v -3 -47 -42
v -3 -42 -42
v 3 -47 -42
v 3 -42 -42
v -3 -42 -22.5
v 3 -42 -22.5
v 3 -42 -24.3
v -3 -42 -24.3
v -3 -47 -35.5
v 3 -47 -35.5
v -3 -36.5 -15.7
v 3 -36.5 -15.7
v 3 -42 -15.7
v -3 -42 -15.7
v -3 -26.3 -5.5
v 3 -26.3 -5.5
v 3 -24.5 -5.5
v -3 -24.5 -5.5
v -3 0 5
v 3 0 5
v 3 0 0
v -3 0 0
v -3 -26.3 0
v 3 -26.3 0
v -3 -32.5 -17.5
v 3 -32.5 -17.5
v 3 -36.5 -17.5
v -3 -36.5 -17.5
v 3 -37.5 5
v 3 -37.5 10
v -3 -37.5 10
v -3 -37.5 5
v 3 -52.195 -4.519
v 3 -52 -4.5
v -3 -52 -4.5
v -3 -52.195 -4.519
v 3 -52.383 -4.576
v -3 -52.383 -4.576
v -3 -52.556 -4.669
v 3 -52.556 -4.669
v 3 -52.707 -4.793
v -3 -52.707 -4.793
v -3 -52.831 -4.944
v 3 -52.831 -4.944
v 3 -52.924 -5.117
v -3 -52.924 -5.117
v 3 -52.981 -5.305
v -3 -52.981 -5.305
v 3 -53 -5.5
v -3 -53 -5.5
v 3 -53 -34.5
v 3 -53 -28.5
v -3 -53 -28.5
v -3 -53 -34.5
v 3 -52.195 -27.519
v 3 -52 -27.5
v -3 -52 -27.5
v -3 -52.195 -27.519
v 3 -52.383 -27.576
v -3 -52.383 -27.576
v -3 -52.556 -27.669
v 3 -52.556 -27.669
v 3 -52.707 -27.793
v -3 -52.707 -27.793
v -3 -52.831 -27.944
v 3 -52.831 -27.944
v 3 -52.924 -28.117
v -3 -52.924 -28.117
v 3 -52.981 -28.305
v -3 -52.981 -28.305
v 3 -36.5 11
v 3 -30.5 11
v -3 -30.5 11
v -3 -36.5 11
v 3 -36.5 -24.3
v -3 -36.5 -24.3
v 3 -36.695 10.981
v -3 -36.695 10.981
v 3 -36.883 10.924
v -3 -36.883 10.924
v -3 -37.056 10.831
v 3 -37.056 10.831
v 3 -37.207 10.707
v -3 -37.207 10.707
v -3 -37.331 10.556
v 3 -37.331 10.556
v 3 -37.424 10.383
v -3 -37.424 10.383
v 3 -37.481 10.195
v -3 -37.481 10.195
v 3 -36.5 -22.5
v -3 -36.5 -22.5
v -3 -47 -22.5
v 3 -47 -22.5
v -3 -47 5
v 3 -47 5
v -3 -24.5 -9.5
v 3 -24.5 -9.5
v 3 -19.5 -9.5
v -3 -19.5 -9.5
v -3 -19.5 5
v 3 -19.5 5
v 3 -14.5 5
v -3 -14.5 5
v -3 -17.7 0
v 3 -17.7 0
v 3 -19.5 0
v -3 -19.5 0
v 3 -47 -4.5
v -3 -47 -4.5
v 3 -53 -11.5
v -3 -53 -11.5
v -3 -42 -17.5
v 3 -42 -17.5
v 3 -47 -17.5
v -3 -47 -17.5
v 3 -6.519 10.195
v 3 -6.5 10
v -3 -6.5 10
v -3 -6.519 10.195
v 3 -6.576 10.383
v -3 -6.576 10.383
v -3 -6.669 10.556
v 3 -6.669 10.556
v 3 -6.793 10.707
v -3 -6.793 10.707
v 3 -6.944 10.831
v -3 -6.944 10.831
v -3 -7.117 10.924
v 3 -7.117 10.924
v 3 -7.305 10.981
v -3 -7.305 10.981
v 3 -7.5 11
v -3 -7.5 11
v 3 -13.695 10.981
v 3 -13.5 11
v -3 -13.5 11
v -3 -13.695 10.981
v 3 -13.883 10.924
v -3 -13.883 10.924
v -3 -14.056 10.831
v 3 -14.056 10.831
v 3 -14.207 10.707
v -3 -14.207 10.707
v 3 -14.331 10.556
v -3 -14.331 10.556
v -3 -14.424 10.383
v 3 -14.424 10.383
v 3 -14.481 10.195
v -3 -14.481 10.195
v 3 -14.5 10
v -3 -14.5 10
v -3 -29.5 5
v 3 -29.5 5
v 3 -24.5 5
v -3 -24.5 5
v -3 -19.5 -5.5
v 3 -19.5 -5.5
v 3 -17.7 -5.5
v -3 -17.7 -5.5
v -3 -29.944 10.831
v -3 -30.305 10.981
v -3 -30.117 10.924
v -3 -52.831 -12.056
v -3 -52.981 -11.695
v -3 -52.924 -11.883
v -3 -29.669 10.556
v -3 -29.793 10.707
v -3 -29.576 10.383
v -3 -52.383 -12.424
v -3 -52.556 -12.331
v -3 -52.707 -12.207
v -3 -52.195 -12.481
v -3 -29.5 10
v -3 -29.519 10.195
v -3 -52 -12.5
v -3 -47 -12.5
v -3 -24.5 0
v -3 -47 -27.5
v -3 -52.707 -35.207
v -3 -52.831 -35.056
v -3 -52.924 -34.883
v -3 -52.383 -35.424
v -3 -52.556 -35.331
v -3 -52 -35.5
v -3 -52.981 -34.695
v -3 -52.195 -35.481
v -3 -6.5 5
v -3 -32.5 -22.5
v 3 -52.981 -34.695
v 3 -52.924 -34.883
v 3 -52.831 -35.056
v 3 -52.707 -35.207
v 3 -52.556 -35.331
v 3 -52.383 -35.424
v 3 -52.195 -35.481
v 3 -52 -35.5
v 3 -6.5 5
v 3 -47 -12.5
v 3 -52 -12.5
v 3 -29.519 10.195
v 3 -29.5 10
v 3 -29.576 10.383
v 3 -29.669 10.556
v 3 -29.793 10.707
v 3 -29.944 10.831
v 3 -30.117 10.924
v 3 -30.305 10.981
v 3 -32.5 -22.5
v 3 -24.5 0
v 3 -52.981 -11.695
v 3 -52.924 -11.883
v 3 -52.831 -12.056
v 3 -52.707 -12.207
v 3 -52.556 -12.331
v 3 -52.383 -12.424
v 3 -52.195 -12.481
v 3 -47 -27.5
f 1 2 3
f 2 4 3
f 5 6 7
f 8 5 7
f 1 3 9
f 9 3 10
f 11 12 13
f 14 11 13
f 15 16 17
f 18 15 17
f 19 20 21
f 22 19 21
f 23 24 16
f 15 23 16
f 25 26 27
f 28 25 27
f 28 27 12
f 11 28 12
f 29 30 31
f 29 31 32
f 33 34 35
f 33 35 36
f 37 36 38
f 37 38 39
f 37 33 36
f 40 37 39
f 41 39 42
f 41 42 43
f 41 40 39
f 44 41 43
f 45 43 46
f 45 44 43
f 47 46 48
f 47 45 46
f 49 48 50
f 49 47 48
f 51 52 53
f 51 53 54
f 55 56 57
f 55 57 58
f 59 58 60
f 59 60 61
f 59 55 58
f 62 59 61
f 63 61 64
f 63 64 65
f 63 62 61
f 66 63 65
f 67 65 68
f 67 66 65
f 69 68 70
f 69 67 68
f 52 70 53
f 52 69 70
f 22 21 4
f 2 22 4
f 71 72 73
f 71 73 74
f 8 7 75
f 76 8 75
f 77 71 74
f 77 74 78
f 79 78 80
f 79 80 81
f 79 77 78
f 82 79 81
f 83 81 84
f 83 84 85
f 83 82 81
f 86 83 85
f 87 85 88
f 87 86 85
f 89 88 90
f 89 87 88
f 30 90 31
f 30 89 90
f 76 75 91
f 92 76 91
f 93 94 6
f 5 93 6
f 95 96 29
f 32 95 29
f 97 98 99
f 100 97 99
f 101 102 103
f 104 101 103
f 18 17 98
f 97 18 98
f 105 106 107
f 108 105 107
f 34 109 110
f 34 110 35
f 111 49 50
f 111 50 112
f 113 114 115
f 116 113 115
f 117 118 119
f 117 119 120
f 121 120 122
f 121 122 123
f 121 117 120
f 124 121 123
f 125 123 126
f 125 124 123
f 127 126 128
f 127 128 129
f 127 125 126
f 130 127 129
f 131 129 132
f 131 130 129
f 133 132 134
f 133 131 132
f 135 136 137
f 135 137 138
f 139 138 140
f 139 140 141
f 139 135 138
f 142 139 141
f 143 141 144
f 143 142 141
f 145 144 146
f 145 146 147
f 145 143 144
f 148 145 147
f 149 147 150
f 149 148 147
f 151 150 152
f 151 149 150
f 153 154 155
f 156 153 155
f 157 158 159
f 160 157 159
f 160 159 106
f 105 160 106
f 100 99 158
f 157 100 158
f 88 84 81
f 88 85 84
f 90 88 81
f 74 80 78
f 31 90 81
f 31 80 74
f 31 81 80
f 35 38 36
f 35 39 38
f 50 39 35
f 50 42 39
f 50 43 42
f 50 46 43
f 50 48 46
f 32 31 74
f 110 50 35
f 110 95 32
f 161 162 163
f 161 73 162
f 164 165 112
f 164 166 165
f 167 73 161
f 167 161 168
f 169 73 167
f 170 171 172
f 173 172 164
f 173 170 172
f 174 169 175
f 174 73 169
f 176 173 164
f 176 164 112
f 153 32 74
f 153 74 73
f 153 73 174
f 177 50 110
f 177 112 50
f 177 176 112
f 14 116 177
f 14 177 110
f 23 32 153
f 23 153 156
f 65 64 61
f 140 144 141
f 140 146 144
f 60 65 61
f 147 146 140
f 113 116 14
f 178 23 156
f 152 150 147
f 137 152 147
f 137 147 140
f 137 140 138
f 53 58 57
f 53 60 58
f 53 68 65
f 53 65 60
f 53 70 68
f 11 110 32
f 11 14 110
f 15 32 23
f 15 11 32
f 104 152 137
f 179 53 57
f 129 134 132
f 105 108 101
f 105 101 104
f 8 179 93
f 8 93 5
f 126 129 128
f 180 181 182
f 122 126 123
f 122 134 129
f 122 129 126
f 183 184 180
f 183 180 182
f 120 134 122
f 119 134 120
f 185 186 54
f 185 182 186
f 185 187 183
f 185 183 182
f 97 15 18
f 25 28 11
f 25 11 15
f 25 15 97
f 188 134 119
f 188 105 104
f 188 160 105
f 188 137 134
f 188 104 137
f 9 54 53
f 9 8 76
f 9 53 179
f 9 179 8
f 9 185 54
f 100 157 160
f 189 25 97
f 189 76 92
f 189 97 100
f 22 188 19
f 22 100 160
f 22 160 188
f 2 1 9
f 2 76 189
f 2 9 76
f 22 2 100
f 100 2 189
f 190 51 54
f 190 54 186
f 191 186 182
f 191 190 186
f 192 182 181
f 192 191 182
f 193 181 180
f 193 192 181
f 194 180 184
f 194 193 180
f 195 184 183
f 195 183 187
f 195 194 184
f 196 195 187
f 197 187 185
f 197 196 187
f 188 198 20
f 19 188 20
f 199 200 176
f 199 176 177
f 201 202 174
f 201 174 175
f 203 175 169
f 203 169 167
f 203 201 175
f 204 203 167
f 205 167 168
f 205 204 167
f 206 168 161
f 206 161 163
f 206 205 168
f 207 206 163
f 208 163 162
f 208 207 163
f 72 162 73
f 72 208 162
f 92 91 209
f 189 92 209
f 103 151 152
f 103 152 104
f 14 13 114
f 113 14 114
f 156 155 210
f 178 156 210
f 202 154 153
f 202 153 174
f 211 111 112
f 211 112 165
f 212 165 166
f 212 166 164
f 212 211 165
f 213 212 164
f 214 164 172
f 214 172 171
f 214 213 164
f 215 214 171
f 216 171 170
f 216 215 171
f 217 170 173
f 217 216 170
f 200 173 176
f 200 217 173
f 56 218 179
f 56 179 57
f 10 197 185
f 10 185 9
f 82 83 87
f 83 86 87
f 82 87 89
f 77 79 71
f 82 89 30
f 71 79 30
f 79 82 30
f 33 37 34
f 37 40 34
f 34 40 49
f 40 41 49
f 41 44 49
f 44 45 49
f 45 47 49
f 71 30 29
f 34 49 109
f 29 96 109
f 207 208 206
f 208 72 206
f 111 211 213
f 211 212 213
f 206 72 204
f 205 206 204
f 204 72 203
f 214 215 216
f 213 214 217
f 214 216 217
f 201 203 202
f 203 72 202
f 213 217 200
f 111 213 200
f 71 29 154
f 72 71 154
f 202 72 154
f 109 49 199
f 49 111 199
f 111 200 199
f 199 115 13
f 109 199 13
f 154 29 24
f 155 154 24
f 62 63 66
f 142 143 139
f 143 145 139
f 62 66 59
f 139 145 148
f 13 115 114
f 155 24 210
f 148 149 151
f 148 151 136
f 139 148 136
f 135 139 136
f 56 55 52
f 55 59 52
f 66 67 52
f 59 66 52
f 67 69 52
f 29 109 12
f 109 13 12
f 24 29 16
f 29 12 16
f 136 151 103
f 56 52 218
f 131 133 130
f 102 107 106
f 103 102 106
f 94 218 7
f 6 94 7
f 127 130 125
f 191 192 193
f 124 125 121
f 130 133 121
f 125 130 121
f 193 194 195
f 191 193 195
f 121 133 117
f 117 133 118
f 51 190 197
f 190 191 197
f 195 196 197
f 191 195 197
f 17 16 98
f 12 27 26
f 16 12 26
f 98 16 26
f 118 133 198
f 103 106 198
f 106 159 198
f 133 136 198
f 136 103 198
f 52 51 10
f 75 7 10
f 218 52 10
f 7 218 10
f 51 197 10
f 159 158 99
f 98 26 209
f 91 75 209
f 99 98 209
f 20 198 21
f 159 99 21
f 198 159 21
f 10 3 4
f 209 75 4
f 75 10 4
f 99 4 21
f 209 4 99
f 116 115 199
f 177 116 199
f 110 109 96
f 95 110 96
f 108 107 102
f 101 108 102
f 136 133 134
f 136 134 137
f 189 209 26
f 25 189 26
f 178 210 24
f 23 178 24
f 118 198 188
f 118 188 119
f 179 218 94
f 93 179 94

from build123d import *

# Parameters (mm, degrees)
BOSS_EXTRU_1_DEPTH      = 3
BOSS_EXTRU_2_DEPTH      = 6
ENL_V_MAT_EXTRU_1_DEPTH = 6


with BuildPart() as part:
    # Esquisse1 → Boss.-Extru.1 (new, symmetric)
    with BuildSketch(Plane(origin=(0, 0, 0), x_dir=(0, -1, 0), z_dir=(1, 0, 0))):
        Polygon((0, 0), (42, 42), (47, 42), (47, -5), (0, -5), align=None)
    extrude(amount=BOSS_EXTRU_1_DEPTH, both=True)

    # Esquisse2 → Boss.-Extru.2 (add)
    with BuildSketch(Plane(origin=(3, 0, 0), x_dir=(0, -1, 0), z_dir=(1, 0, 0))):
        with BuildLine():
            Line((47, 35.5), (47, 27.5))
            Line((47, 27.5), (52, 27.5))
            ThreePointArc((52, 27.5), (52.707106781, 27.792893219), (53, 28.5))
            Line((53, 28.5), (53, 34.5))
            ThreePointArc((53, 34.5), (52.707106781, 35.207106781), (52, 35.5))
            Line((52, 35.5), (47, 35.5))
        make_face()
        with BuildLine():
            Line((47, 12.5), (47, 4.5))
            Line((47, 4.5), (52, 4.5))
            ThreePointArc((52, 4.5), (52.707106781, 4.792893219), (53, 5.5))
            Line((53, 5.5), (53, 11.5))
            ThreePointArc((53, 11.5), (52.707106781, 12.207106781), (52, 12.5))
            Line((52, 12.5), (47, 12.5))
        make_face()
        with BuildLine():
            Line((14.5, -10), (14.5, -5))
            Line((14.5, -5), (6.5, -5))
            Line((6.5, -5), (6.5, -10))
            ThreePointArc((6.5, -10), (6.792893219, -10.707106781), (7.5, -11))
            Line((7.5, -11), (13.5, -11))
            ThreePointArc((13.5, -11), (14.207106781, -10.707106781), (14.5, -10))
        make_face()
        with BuildLine():
            Line((37.5, -10), (37.5, -5))
            Line((37.5, -5), (29.5, -5))
            Line((29.5, -5), (29.5, -10))
            ThreePointArc((29.5, -10), (29.792893219, -10.707106781), (30.5, -11))
            Line((30.5, -11), (36.5, -11))
            ThreePointArc((36.5, -11), (37.207106781, -10.707106781), (37.5, -10))
        make_face()
    extrude(amount=-BOSS_EXTRU_2_DEPTH)

    # Esquisse2_3 → Enl_v. mat.-Extru.1 (cut)
    with BuildSketch(Plane(origin=(3, 0, 0), x_dir=(0, -1, 0), z_dir=(1, 0, 0))):
        Polygon((42, 17.5), (47, 17.5), (47, 22.5), (42, 22.5), (42, 24.3), (36.5, 24.3), (36.5, 22.5), (32.5, 22.5), (32.5, 17.5), (36.5, 17.5), (36.5, 15.7), (42, 15.7), align=None)
        Polygon((19.5, -5), (24.5, -5), (24.5, 0), (26.3, 0), (26.3, 5.5), (24.5, 5.5), (24.5, 9.5), (19.5, 9.5), (19.5, 5.5), (17.7, 5.5), (17.7, 0), (19.5, 0), align=None)
    extrude(amount=-ENL_V_MAT_EXTRU_1_DEPTH, mode=Mode.SUBTRACT)


solid = part.part
